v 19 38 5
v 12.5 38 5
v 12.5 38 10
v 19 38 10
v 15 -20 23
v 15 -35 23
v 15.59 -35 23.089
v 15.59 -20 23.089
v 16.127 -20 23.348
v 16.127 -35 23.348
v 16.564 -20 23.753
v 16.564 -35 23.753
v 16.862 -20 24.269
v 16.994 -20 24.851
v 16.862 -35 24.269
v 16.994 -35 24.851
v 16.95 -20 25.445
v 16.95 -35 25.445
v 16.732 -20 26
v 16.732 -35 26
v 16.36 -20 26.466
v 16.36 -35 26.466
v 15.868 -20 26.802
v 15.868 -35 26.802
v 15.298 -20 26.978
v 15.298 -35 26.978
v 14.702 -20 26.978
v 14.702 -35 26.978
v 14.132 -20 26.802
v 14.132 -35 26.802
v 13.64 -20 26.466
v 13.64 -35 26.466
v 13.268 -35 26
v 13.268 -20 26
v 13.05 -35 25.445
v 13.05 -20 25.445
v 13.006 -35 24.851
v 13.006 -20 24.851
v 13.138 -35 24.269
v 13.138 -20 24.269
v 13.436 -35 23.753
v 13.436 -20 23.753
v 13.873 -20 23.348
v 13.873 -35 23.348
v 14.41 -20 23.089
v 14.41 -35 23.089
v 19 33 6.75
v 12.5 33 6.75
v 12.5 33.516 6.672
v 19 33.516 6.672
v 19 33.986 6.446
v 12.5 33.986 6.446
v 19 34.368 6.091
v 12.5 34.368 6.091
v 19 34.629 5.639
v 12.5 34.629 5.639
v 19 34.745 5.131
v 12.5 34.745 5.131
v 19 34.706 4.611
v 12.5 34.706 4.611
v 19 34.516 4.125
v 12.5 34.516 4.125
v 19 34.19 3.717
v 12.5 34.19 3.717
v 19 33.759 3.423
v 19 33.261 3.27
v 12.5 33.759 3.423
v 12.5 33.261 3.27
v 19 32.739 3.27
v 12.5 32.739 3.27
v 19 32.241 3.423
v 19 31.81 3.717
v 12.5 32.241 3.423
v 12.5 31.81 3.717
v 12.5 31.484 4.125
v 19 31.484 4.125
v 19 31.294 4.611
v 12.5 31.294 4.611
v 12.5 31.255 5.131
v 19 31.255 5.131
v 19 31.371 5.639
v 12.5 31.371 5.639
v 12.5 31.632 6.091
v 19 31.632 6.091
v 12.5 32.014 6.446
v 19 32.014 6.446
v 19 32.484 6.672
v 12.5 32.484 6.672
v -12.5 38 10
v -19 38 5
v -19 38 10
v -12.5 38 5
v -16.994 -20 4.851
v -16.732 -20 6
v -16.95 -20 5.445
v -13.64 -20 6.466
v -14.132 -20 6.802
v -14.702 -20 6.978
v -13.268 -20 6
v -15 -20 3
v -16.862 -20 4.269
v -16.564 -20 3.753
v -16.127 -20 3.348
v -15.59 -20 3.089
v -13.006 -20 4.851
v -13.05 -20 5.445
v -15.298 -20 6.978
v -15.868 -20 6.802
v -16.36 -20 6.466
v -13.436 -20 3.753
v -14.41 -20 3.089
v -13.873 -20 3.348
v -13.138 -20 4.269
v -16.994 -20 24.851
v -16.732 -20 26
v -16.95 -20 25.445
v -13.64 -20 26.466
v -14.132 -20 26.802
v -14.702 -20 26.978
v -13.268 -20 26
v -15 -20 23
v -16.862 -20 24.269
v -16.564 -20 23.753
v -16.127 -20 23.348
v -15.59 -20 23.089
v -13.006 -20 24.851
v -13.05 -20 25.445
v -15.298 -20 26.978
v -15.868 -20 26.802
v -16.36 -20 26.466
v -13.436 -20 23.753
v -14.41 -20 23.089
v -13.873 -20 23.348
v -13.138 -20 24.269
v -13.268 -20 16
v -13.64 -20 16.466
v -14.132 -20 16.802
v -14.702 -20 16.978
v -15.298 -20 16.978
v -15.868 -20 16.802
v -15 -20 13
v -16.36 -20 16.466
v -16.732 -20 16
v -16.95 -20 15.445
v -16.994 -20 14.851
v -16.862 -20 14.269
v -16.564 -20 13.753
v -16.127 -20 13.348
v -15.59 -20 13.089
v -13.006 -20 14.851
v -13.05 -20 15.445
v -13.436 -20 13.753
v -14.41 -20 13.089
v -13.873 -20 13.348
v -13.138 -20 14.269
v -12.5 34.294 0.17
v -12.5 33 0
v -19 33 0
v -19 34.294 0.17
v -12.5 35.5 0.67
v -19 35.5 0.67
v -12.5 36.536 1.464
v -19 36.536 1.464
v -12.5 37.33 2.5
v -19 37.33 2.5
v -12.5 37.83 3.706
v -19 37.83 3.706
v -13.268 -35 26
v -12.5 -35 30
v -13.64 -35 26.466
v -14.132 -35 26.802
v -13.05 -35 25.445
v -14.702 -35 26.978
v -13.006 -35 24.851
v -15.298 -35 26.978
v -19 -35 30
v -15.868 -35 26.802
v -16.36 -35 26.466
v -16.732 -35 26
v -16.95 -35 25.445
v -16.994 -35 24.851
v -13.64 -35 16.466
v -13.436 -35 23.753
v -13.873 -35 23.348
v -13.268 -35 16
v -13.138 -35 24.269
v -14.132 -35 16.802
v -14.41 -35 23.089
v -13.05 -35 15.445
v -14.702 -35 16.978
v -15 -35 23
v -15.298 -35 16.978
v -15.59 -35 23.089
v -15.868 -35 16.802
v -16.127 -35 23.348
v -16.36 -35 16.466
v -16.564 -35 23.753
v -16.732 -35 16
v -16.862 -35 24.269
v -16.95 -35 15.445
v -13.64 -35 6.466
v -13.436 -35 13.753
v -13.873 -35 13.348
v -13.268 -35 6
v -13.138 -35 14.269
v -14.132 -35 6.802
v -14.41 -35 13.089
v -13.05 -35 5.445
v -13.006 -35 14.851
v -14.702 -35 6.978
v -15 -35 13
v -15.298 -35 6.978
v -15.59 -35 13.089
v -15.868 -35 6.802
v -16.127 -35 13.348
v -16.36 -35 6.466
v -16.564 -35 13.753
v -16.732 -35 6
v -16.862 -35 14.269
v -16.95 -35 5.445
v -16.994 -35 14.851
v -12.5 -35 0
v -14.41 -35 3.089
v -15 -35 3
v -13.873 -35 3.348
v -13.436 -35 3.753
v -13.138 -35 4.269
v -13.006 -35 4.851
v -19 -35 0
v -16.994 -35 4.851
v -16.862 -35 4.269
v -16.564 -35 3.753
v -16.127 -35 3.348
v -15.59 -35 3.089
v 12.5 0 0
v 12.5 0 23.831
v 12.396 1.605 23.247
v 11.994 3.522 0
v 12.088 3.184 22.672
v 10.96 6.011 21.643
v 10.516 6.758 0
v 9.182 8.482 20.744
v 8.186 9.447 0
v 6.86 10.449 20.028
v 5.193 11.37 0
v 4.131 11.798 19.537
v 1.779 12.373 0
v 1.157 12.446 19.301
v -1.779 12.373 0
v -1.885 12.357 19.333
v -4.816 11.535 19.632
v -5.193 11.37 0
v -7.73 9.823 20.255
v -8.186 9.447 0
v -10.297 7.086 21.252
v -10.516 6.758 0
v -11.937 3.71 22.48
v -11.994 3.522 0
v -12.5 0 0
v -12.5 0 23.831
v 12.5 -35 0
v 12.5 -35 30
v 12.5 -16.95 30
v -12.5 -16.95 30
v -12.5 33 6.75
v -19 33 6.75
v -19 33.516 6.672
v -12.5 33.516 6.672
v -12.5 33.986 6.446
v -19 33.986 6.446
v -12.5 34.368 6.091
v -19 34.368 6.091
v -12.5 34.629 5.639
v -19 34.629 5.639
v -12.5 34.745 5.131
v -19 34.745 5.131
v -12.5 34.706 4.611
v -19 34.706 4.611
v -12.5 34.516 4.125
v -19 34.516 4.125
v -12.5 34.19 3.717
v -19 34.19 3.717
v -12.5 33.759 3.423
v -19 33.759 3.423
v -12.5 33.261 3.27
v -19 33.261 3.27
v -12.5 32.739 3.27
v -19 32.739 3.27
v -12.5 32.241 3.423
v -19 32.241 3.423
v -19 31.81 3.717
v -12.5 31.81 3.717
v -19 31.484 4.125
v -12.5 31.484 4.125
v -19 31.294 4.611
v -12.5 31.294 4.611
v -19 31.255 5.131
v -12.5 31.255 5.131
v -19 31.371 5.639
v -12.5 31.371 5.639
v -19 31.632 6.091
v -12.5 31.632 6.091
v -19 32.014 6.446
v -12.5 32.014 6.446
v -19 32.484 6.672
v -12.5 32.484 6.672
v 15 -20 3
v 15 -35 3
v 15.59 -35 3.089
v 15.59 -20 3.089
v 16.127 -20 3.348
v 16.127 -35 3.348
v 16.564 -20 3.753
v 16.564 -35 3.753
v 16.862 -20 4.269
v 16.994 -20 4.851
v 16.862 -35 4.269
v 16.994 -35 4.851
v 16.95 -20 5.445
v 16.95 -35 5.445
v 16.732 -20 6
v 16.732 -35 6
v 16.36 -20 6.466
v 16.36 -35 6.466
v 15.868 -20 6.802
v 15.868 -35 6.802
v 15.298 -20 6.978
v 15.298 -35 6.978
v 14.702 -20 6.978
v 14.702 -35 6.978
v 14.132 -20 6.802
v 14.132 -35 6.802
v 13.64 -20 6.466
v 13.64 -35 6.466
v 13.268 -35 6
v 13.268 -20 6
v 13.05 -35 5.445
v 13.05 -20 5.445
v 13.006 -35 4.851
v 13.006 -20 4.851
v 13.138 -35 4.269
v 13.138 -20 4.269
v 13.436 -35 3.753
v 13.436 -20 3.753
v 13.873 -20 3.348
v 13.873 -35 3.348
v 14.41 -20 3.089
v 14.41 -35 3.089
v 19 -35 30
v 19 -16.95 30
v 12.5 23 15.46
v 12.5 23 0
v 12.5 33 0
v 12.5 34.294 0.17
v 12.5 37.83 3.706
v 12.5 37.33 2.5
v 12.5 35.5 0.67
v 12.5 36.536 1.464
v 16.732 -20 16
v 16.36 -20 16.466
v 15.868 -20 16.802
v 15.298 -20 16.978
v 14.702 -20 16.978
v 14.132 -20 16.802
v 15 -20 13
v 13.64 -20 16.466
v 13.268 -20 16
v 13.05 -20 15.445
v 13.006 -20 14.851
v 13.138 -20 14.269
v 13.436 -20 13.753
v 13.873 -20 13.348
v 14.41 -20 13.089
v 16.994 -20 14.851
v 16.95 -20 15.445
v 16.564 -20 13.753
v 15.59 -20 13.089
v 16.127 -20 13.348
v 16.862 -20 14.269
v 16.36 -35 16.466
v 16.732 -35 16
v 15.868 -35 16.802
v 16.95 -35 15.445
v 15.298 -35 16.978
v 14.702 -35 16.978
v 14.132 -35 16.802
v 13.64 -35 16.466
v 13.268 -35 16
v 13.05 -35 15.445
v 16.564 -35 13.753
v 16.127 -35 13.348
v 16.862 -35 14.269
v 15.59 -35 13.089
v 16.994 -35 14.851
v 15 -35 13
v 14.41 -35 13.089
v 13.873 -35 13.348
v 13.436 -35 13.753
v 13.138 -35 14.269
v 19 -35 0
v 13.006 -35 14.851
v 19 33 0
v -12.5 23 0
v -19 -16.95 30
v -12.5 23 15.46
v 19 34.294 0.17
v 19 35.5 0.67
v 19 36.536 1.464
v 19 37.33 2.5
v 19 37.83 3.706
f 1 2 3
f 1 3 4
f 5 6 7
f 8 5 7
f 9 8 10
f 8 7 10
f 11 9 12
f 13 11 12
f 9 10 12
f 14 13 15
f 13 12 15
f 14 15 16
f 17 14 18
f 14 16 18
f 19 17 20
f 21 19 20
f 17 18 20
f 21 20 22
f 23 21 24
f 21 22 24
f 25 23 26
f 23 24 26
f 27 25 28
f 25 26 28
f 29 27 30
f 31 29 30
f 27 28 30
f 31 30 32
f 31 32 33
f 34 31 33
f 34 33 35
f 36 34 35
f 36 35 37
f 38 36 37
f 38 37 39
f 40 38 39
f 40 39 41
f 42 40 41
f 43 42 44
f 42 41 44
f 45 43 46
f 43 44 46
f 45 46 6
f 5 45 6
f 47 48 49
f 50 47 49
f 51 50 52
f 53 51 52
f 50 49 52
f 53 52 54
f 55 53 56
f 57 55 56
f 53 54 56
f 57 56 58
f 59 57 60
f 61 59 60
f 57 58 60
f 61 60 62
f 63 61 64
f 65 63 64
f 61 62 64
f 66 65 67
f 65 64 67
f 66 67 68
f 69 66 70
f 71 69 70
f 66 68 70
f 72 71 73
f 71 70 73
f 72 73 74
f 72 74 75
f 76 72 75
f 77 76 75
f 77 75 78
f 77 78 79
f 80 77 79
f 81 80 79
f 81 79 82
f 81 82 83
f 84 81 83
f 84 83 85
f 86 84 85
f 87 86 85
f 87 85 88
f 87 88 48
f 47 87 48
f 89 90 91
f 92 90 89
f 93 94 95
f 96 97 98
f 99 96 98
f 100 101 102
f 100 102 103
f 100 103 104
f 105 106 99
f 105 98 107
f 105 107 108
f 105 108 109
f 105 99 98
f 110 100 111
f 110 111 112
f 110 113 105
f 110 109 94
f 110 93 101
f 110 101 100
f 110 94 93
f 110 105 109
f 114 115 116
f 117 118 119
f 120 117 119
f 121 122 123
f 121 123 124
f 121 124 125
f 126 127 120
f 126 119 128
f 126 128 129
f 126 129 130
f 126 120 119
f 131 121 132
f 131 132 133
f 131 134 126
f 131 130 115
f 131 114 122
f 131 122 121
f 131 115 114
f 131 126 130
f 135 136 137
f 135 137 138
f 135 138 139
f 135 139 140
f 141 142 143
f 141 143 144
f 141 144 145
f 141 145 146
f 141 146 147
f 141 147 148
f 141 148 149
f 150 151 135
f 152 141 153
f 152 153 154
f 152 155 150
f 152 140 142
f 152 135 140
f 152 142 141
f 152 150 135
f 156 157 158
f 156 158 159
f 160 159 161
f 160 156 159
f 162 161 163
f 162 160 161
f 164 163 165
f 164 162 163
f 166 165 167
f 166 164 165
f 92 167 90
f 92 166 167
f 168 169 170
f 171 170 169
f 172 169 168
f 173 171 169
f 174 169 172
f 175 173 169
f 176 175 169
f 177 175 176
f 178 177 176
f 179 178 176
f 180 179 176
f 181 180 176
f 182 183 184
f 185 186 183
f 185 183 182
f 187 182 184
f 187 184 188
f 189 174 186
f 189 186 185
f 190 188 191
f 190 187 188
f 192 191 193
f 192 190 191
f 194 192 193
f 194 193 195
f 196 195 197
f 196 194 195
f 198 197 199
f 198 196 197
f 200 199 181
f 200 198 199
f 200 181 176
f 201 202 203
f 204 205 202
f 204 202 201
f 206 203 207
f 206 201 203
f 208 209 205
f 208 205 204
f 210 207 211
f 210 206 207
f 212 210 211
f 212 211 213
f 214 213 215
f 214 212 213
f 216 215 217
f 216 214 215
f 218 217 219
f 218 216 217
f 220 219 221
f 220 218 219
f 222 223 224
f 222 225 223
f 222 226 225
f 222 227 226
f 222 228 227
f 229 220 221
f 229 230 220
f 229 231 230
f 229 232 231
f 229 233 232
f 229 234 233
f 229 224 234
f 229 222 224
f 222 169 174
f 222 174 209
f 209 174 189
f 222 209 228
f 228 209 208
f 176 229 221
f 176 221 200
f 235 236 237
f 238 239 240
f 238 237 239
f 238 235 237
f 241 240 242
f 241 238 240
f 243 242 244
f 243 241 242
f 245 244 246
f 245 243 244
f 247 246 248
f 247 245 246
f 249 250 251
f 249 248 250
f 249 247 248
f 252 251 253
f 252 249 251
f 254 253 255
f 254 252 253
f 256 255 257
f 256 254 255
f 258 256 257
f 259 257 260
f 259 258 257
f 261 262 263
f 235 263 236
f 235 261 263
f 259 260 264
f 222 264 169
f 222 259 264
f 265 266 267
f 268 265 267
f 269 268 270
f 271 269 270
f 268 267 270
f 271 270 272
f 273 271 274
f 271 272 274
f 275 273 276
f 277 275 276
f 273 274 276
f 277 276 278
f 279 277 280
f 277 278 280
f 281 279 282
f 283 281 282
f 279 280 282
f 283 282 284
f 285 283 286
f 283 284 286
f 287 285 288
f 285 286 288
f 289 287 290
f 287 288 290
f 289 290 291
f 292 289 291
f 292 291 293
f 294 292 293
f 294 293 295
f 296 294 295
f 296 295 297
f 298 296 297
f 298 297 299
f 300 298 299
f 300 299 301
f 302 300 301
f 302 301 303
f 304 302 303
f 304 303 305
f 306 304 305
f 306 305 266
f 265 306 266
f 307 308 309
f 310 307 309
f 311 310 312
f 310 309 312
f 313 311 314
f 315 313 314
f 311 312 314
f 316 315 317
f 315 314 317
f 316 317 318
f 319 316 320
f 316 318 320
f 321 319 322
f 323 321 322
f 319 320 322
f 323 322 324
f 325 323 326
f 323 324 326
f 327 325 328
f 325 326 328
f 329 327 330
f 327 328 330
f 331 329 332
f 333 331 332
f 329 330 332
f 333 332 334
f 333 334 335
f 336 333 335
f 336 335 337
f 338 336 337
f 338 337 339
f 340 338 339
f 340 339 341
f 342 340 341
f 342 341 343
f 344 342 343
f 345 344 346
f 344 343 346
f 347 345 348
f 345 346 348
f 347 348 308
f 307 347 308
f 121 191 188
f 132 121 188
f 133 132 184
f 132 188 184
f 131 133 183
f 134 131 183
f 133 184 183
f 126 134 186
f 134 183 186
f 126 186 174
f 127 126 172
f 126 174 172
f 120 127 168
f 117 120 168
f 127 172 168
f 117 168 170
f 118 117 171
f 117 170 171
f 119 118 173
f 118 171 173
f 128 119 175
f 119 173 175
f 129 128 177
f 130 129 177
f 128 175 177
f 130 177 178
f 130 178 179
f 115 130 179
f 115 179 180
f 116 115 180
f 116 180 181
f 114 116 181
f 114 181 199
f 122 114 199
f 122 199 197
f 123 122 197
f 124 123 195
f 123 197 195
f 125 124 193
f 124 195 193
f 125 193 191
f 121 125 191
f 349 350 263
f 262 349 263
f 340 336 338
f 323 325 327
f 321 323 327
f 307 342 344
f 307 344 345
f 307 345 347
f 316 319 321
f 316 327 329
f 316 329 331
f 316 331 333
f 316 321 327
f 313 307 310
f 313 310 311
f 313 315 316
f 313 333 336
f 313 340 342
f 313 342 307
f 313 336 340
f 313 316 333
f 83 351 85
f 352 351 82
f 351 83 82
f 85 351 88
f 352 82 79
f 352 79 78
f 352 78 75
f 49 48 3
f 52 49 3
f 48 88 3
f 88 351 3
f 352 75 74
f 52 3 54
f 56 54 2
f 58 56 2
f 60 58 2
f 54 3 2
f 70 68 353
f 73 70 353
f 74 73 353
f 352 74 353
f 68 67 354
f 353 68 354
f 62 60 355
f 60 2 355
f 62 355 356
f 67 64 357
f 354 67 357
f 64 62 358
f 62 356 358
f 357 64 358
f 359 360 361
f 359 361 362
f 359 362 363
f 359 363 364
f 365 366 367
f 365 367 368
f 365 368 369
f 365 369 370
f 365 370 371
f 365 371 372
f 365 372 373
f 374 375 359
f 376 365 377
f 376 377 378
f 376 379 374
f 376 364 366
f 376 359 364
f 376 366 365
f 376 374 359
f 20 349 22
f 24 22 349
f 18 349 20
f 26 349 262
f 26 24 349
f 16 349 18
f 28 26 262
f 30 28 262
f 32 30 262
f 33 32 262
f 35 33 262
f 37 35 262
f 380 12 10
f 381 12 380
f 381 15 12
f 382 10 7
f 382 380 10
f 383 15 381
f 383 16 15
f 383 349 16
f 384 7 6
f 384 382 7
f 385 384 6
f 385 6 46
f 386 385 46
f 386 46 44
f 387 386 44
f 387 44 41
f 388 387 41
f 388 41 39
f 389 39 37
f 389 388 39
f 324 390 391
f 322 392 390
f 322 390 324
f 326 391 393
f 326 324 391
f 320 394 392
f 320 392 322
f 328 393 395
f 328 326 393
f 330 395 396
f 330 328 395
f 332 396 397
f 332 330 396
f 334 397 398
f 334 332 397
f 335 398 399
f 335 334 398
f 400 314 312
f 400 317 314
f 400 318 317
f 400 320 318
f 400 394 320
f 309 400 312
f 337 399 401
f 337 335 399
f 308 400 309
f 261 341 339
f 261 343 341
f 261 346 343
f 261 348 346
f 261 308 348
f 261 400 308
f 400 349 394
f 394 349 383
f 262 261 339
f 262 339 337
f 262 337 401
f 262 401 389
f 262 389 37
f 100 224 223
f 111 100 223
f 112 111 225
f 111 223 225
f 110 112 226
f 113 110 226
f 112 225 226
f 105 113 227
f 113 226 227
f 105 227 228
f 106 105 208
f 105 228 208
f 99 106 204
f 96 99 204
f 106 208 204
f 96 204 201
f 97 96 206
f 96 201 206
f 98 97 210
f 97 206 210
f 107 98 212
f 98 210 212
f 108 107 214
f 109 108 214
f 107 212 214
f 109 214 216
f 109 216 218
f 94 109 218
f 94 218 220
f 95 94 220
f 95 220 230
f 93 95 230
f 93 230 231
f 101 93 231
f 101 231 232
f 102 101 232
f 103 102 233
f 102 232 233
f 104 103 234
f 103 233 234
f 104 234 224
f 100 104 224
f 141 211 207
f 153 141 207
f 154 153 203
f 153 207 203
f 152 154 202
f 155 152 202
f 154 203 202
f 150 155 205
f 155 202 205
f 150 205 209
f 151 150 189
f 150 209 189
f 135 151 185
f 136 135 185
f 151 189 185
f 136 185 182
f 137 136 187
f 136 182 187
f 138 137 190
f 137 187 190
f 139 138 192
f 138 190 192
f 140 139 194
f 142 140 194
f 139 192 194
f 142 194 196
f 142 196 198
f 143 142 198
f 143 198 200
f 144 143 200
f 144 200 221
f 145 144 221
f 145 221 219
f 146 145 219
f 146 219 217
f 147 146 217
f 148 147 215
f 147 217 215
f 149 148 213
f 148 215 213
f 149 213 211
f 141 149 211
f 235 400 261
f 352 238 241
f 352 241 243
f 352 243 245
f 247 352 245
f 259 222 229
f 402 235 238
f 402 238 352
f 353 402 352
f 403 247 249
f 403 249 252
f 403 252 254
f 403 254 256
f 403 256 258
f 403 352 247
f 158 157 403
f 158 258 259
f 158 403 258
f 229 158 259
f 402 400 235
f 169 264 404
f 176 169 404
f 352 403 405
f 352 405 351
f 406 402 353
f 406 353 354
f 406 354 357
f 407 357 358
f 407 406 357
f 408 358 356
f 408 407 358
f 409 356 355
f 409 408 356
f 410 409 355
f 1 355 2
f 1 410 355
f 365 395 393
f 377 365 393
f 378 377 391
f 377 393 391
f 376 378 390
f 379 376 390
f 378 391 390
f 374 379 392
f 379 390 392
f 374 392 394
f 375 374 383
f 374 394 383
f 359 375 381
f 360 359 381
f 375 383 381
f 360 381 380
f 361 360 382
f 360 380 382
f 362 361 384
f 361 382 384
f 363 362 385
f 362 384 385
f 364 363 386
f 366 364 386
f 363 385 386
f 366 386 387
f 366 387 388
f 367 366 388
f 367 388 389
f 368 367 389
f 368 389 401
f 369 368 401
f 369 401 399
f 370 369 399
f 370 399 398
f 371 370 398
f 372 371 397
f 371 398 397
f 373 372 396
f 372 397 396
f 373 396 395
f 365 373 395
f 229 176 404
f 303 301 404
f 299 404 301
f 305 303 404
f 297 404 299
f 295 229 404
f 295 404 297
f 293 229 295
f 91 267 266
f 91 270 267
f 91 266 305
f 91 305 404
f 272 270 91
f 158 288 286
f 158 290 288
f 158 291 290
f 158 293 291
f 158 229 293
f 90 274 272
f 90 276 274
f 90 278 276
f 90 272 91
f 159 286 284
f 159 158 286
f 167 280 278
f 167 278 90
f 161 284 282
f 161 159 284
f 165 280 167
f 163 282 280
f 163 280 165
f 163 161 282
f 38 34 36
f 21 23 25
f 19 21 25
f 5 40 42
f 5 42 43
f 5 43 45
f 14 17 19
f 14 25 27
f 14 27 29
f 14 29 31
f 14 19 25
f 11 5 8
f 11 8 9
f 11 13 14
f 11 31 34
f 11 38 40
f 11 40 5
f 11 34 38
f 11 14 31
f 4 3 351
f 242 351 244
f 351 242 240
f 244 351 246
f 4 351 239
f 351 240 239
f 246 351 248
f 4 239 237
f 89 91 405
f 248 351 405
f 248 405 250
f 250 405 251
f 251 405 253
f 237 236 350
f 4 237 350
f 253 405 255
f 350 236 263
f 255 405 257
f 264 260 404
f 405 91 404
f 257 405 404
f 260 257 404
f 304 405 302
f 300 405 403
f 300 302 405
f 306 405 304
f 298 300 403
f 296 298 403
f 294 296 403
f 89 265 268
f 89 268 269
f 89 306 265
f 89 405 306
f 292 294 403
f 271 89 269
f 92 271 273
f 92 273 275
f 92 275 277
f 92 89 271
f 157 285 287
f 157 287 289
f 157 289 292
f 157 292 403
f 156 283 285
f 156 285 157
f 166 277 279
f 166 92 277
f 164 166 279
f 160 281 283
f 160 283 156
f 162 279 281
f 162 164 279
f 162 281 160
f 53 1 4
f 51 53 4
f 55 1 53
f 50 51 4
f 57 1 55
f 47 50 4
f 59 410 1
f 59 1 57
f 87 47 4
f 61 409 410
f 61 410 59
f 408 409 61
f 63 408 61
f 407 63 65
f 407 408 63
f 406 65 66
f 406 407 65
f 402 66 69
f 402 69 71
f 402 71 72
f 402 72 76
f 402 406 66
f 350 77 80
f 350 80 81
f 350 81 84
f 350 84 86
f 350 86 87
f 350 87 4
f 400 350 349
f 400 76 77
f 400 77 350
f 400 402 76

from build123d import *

# Parameters (mm, degrees)
BOSS_EXTRUDE1_DEPTH = 30
SKETCH2_R           = 2
CUT_EXTRUDE1_DEPTH  = 15
FILLET1_R           = 5
CHAMFER1_SIZE       = 20
CHAMFER1_SIZE_2     = 54.949548389
SKETCH3_W           = 25
SKETCH3_H           = 39.596952294
CUT_EXTRUDE2_DEPTH  = 15
SKETCH4_R           = 1.75
CUT_EXTRUDE3_DEPTH  = 62.546730214


with BuildPart() as part:
    # Sketch1 → Boss-Extrude1 (new body)
    with BuildSketch(Plane.XY):
        with BuildLine():
            Line((-12.5, 0), (-12.5, -35))
            Line((-12.5, -35), (-19, -35))
            Line((-19, -35), (-19, 38))
            Line((-19, 38), (19, 38))
            Line((19, 38), (19, -35))
            Line((19, -35), (12.5, -35))
            Line((12.5, -35), (12.5, 0))
            ThreePointArc((12.5, 0), (0, 12.5), (-12.5, 0))
        make_face()
    extrude(amount=BOSS_EXTRUDE1_DEPTH)

    # Sketch2 → Cut-Extrude1 (cut)
    with BuildSketch(Plane.XZ.offset(35)):
        with Locations(Location((-15, 5, 0), (0, 0, 270))):
            Circle(SKETCH2_R)
        with Locations(Location((15, 5, 0), (0, 0, 270))):
            Circle(SKETCH2_R)
        with Locations(Location((-15, 15, 0), (0, 0, 270))):
            Circle(SKETCH2_R)
        with Locations(Location((15, 15, 0), (0, 0, 270))):
            Circle(SKETCH2_R)
        with Locations(Location((-15, 25, 0), (0, 0, 270))):
            Circle(SKETCH2_R)
        with Locations(Location((15, 25, 0), (0, 0, 270))):
            Circle(SKETCH2_R)
    extrude(amount=-CUT_EXTRUDE1_DEPTH, mode=Mode.SUBTRACT)

    # Fillet1
    fillet1_edges = [part.edges().sort_by_distance(p)[0] for p in [
        (0, 38, 0),
    ]]
    fillet(fillet1_edges, radius=FILLET1_R)

    # Chamfer1
    # the kernel refuses this chamfer: 54.949548389, 20 mm, written as the material it takes off along each edge
    with BuildSketch(Plane(origin=(-161.549828987, 38, 30), x_dir=(0, 0.09904090225205052, -0.9950833631817486), z_dir=(1, 0, 0))) as chamfer1_piece_1:
        Polygon((CHAMFER1_SIZE * 0.995083363182, -CHAMFER1_SIZE * 0.0990409022521), (-CHAMFER1_SIZE_2 * 0.0990409022522, -CHAMFER1_SIZE_2 * 0.995083363183), (0, 0), align=None)
    extrude(amount=323.099657974, mode=Mode.SUBTRACT)

    # Sketch3 → Cut-Extrude2 (cut)
    with BuildSketch(Plane(origin=(0, 38, 0), x_dir=(1, 0, 0), z_dir=(0, 1, 0))):
        Rectangle(SKETCH3_W, SKETCH3_H)
    extrude(amount=-CUT_EXTRUDE2_DEPTH, mode=Mode.SUBTRACT)

    # Sketch4 → Cut-Extrude3 (cut, through all)
    with BuildSketch(Plane.ZY.offset(19)):
        with Locations((5, 33)):
            Circle(SKETCH4_R)
    extrude(amount=-CUT_EXTRUDE3_DEPTH, mode=Mode.SUBTRACT)


solid = part.part
